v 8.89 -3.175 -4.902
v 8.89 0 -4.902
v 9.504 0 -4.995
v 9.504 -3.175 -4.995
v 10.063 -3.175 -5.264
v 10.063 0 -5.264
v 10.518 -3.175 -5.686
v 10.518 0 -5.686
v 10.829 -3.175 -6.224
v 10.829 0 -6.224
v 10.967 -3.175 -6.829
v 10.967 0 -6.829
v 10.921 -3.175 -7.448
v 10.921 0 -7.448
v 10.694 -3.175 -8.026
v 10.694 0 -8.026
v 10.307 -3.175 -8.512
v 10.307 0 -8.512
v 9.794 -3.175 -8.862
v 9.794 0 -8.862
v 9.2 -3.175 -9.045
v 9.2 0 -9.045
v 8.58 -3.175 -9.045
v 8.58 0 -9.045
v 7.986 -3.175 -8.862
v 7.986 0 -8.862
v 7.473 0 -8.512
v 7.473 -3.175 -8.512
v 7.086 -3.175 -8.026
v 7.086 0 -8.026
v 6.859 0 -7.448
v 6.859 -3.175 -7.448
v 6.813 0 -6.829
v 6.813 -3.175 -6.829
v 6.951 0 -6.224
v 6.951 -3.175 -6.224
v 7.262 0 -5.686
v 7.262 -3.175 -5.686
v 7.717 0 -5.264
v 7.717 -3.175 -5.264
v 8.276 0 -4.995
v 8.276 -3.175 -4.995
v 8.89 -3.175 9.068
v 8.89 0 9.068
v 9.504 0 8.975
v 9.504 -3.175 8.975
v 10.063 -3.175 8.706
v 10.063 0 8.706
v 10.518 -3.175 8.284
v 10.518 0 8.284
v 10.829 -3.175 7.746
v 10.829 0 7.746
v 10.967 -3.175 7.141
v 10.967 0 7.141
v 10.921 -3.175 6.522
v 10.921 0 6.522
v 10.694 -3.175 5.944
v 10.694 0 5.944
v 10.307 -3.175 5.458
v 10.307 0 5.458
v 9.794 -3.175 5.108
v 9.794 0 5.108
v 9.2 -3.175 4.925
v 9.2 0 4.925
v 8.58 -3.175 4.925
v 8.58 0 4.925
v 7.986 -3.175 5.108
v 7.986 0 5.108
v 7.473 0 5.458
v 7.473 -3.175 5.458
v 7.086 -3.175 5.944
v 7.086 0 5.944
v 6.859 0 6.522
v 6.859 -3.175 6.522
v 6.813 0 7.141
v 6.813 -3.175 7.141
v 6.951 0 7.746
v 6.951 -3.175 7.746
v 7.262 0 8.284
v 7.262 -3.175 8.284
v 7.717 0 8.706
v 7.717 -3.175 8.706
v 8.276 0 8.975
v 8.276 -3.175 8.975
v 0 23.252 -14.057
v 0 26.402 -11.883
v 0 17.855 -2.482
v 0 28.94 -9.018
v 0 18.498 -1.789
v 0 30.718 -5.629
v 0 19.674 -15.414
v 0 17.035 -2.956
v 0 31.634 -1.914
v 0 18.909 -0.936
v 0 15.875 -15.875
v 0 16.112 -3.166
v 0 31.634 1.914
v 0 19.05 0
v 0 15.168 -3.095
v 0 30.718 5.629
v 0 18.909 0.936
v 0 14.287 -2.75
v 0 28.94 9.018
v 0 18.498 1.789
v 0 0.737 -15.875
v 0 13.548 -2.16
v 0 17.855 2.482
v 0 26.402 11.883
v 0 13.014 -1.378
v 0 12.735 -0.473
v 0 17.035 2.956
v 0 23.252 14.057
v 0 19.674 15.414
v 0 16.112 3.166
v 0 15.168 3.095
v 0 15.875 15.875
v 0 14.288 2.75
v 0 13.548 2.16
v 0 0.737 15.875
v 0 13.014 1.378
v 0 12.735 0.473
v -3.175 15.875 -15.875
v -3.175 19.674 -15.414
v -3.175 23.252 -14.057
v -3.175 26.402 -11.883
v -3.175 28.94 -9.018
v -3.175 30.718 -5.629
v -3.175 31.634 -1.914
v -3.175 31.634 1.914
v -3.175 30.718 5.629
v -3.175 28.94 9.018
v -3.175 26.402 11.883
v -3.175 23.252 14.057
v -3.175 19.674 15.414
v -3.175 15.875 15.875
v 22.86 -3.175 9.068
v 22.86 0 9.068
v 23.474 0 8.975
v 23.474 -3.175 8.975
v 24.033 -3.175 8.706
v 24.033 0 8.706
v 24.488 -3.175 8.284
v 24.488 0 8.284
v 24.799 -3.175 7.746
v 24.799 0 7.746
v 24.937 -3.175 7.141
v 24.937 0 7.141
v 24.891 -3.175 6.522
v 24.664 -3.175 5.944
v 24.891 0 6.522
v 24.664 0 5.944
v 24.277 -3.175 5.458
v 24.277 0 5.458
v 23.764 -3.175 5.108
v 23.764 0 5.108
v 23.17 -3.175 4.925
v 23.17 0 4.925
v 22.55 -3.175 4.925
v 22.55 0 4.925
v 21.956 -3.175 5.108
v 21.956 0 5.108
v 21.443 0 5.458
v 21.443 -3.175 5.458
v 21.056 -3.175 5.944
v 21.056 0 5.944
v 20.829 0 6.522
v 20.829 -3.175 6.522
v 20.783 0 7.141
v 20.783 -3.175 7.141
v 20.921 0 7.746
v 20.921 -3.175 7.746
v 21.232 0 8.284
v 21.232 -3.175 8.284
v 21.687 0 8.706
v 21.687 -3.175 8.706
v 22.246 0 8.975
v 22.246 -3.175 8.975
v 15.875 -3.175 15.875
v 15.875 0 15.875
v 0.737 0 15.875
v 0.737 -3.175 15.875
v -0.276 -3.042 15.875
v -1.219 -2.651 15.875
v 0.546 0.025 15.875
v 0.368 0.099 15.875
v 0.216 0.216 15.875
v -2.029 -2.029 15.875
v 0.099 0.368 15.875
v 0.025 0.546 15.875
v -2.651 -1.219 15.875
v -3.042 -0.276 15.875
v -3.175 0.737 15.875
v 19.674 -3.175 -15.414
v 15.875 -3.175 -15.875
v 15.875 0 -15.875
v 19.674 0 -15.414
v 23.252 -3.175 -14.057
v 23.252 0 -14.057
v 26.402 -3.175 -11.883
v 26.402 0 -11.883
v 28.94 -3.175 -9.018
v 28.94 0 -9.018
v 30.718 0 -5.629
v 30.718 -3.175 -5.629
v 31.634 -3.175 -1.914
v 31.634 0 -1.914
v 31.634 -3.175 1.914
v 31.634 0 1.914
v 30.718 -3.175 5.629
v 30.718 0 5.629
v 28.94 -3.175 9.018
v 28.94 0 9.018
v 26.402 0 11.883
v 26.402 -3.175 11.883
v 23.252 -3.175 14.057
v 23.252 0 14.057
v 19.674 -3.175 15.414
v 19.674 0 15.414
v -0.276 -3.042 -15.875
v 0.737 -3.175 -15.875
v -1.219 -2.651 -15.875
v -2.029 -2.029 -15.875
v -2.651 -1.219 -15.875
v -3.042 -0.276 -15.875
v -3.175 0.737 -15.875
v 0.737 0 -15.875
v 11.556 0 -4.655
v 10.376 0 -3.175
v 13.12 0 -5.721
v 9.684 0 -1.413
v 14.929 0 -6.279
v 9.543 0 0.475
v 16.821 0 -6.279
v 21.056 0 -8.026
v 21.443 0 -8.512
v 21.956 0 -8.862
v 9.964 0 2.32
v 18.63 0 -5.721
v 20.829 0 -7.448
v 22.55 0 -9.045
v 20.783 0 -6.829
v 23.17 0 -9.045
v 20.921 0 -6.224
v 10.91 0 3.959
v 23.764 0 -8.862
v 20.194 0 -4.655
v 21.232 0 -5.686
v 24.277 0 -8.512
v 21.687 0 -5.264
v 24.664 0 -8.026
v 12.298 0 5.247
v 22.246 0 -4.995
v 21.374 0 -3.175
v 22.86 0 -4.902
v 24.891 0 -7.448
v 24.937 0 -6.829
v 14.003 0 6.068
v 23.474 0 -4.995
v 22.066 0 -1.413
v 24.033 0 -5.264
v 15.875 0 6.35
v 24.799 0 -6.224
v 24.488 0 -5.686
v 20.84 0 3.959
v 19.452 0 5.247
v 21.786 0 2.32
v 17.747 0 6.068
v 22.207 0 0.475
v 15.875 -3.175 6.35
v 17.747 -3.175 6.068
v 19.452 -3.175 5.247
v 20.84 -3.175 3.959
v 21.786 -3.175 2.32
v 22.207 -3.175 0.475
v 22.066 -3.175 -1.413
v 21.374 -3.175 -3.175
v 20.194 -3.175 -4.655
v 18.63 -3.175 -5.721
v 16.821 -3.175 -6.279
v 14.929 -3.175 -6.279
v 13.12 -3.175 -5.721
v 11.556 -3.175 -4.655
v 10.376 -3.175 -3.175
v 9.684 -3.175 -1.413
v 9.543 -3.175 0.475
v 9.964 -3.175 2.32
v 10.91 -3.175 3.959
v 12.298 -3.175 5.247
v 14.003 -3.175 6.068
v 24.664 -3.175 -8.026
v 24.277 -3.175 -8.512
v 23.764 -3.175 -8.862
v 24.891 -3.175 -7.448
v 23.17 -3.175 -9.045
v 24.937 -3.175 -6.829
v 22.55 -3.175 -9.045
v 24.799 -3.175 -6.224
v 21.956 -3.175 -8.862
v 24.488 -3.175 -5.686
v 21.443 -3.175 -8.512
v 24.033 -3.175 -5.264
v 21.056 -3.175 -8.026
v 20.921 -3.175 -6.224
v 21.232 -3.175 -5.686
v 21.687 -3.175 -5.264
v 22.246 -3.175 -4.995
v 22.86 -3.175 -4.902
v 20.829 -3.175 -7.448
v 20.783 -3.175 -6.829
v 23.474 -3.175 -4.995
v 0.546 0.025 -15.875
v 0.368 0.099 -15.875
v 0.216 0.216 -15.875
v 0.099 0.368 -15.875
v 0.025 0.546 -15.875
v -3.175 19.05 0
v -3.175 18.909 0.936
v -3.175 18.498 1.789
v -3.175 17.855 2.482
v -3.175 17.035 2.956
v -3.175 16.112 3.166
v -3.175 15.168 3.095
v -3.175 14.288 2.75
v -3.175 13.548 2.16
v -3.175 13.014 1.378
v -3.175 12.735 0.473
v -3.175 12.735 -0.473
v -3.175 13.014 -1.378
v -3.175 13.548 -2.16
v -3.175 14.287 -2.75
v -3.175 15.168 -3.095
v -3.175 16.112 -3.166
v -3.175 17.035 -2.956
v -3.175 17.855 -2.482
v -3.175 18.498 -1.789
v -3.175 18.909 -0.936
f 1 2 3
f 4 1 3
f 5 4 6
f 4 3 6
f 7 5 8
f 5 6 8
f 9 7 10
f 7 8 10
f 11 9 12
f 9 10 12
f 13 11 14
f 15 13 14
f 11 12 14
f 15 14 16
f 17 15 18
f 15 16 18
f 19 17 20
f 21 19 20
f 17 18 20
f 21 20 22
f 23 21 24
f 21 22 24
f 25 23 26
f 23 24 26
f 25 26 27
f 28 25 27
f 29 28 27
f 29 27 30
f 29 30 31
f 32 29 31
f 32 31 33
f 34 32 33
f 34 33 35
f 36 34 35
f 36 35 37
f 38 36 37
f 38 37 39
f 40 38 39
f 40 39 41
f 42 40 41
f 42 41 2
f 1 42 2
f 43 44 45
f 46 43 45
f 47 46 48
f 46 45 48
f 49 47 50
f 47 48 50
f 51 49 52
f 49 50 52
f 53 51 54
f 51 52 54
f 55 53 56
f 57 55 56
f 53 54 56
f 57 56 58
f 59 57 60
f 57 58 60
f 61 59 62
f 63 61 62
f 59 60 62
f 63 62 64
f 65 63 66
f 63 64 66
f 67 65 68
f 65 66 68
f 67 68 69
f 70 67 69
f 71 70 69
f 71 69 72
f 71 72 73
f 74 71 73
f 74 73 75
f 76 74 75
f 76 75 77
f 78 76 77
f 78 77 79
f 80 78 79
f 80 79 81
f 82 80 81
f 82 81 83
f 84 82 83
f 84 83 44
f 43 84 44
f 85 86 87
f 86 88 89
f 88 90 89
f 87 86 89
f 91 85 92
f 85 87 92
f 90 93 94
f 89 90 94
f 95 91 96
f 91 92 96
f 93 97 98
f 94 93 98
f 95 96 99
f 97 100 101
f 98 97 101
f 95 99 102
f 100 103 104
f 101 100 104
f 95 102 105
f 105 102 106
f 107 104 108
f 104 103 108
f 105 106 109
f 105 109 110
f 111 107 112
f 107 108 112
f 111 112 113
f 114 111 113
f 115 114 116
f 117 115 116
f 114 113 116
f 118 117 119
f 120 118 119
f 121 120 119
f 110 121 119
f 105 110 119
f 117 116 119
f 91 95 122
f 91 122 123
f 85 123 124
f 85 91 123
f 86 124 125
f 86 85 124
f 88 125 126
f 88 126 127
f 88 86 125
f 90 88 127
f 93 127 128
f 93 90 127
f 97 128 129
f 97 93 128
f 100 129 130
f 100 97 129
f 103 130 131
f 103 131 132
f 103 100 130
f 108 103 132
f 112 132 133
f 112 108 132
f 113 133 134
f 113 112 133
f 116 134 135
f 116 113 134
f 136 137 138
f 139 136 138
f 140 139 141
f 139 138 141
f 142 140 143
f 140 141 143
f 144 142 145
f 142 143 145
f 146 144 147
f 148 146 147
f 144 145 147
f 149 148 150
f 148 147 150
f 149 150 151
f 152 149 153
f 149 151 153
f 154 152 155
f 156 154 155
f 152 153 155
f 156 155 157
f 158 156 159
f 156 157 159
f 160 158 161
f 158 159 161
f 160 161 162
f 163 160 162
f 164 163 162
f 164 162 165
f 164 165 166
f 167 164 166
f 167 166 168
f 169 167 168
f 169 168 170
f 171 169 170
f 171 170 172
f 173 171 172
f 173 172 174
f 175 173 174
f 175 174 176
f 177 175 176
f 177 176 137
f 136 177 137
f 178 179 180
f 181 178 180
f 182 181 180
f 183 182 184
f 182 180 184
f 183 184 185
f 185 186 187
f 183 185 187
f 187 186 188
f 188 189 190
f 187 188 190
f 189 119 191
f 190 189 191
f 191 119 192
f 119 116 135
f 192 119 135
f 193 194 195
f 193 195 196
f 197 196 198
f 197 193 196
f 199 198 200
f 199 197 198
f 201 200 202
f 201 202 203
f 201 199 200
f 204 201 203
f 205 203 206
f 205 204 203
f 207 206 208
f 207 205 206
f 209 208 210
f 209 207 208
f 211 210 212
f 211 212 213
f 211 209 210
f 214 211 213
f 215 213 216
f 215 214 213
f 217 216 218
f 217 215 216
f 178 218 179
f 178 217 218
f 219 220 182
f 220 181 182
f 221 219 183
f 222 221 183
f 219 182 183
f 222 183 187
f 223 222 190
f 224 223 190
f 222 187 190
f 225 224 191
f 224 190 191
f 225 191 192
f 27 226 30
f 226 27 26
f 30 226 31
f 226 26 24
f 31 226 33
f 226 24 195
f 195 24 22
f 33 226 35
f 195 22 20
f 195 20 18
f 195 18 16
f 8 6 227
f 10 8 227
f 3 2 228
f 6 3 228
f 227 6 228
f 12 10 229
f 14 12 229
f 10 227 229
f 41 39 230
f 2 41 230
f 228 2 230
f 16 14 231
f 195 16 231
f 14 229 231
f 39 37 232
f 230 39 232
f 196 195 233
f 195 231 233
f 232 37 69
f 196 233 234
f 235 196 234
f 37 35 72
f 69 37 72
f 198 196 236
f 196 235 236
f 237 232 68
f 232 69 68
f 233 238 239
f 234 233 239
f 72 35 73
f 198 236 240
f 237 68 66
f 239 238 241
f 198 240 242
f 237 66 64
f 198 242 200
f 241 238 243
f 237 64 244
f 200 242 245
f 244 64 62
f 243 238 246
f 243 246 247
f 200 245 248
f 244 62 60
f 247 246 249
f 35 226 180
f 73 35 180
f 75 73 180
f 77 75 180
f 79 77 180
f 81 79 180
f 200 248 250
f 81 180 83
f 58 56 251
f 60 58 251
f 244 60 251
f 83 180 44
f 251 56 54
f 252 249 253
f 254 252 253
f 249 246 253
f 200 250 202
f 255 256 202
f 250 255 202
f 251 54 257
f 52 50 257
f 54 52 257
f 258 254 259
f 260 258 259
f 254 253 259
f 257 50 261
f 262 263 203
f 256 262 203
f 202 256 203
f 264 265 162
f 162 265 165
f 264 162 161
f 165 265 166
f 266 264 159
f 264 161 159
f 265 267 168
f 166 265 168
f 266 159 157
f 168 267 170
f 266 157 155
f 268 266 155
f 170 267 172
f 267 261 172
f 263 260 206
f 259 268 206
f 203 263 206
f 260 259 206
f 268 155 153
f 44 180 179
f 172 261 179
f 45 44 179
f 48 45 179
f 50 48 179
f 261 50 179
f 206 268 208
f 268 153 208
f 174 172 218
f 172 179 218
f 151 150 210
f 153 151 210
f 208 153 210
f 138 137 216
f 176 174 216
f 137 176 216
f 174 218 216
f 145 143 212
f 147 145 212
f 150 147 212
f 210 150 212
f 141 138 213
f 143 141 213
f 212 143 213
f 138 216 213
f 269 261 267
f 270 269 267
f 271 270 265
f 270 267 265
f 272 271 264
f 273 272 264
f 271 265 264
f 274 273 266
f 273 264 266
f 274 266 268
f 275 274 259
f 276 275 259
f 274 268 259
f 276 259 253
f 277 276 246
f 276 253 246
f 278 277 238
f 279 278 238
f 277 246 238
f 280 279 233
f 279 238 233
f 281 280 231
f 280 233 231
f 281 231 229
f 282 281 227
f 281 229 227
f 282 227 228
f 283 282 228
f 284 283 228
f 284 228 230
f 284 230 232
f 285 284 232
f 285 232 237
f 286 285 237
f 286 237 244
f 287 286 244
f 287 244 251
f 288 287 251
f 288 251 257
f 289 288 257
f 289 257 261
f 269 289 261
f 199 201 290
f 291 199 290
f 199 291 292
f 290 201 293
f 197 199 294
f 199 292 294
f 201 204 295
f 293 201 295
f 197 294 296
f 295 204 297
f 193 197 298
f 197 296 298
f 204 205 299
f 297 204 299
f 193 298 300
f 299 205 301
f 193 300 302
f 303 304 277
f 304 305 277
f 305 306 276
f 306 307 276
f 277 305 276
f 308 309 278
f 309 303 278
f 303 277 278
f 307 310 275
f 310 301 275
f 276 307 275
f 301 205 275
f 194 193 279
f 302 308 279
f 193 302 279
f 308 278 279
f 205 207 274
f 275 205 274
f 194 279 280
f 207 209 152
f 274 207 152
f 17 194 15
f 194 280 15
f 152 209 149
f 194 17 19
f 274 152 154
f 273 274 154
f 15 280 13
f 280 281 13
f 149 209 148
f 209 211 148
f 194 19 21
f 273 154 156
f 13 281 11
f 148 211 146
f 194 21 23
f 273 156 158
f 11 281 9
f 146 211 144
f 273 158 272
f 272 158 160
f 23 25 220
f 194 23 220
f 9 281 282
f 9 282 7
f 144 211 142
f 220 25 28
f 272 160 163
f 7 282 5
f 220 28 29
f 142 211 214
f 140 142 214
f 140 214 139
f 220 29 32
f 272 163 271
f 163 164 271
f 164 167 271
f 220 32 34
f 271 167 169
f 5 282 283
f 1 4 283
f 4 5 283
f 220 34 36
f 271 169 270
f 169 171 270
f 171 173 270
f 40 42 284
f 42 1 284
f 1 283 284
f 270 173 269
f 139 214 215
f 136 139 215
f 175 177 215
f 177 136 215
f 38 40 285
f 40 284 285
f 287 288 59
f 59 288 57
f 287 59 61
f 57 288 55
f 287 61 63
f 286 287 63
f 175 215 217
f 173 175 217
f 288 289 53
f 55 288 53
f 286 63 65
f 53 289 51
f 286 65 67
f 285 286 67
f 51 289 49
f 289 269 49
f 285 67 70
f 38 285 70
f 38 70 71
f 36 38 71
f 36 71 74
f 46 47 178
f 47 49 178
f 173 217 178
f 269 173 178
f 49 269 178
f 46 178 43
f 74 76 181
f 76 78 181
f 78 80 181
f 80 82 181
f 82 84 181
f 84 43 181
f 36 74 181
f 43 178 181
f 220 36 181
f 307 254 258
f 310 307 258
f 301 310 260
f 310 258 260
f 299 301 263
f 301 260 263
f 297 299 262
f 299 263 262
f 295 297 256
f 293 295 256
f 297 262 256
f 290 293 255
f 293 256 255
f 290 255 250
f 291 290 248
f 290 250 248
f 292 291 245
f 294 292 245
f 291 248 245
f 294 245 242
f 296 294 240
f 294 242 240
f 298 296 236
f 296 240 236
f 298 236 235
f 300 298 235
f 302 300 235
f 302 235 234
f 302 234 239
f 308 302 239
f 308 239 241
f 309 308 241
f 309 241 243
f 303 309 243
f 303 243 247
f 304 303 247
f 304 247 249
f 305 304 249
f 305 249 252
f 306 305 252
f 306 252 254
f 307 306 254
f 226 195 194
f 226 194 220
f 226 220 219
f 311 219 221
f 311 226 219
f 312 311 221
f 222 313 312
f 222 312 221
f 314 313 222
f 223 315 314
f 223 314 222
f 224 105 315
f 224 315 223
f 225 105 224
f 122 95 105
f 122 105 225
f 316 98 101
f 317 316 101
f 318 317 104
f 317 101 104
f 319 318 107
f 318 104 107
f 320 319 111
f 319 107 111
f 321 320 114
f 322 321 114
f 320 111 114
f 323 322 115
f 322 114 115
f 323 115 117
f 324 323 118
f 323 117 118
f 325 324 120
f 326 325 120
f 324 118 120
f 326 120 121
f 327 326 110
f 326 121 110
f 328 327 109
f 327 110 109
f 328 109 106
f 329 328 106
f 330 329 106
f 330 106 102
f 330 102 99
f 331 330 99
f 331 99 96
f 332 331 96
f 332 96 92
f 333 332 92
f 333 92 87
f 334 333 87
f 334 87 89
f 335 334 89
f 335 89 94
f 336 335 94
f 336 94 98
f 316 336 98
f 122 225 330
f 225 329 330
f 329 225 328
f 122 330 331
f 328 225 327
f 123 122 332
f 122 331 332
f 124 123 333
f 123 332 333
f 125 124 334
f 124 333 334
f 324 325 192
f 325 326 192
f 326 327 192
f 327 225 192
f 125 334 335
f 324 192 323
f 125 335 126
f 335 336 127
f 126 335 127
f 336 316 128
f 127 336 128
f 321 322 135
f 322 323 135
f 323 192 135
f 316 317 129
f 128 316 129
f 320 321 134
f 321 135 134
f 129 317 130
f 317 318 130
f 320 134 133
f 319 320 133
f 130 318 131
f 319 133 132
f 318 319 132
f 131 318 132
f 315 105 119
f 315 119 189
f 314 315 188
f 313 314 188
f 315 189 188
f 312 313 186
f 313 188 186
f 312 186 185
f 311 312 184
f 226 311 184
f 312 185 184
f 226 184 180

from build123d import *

# Parameters (mm, degrees)
BASE_FLANGE1_DEPTH = 15.875
FILLET1_RADIUS     = 15.875
FILLET1_LENGTH     = 3.175
FILLET2_RADIUS     = 15.875
FILLET2_LENGTH     = 3.175
SKETCH6_R          = 3.175
CUT_EXTRUDE1_DEPTH = 48.625
SKETCH7_R          = 6.35
CUT_EXTRUDE2_DEPTH = 48.625
SKETCH8_R          = 2.0828
CUT_EXTRUDE3_DEPTH = 48.625


# Sheet-metal steps are written as plain solids
with BuildPart() as part:
    # Sketch1 → Base-Flange1 (new, symmetric)
    with BuildSketch(Plane.XY):
        with BuildLine():
            Line((0, 31.75), (0, 0.7366))
            ThreePointArc((0, 0.7366), (0.215745145, 0.215745145), (0.7366, 0))
            Line((0.7366, 0), (31.75, 0))
            Line((31.75, 0), (31.75, -3.175))
            Line((31.75, -3.175), (0.7366, -3.175))
            ThreePointArc((0.7366, -3.175), (-2.029318885, -2.029318885), (-3.175, 0.7366))
            Line((-3.175, 0.7366), (-3.175, 31.75))
            Line((-3.175, 31.75), (0, 31.75))
        make_face()
    extrude(amount=BASE_FLANGE1_DEPTH, both=True)

    # Fillet1: full round fillet: the end face becomes a half cylinder, R = half its width
    fillet1_face = Plane((-1.5875, 31.75, 0), x_dir=(1, 0, 0), z_dir=(0, 1, 0))  # on the end face: x along it, z out of the body
    fillet1_slab = fillet1_face.offset(-FILLET1_RADIUS / 2) * Box(FILLET1_LENGTH, 2 * FILLET1_RADIUS, FILLET1_RADIUS, mode=Mode.PRIVATE)  # the body's end, R deep
    fillet1_round = Plane((-1.5875, 15.875, 0), x_dir=(0, 1, 0), z_dir=(1, 0, 0)) * Cylinder(FILLET1_RADIUS, FILLET1_LENGTH, mode=Mode.PRIVATE)  # its axis R under the face
    add(fillet1_slab - fillet1_round, mode=Mode.SUBTRACT)

    # Fillet2: full round fillet: the end face becomes a half cylinder, R = half its width
    fillet2_face = Plane((31.75, -1.5875, 0), x_dir=(0, -1, 0), z_dir=(1, 0, 0))  # on the end face: x along it, z out of the body
    fillet2_slab = fillet2_face.offset(-FILLET2_RADIUS / 2) * Box(FILLET2_LENGTH, 2 * FILLET2_RADIUS, FILLET2_RADIUS, mode=Mode.PRIVATE)  # the body's end, R deep
    fillet2_round = Plane((15.875, -1.5875, 0), x_dir=(1, 0, 0), z_dir=(0, -1, 0)) * Cylinder(FILLET2_RADIUS, FILLET2_LENGTH, mode=Mode.PRIVATE)  # its axis R under the face
    add(fillet2_slab - fillet2_round, mode=Mode.SUBTRACT)

    # Sketch6 → Cut-Extrude1 (cut, through all)
    with BuildSketch(Plane(origin=(0, 0, 0), x_dir=(0, 0, -1), z_dir=(1, 0, 0))):
        with Locations(Location((0, 15.875, 0), (0, 0, 90))):
            Circle(SKETCH6_R)
    extrude(amount=-CUT_EXTRUDE1_DEPTH, mode=Mode.SUBTRACT)

    # Sketch7 → Cut-Extrude2 (cut, through all)
    with BuildSketch(Plane(origin=(0, 0, 0), x_dir=(1, 0, 0), z_dir=(0, 1, 0))):
        with Locations(Location((15.875, 0, 0), (0, 0, 270))):
            Circle(SKETCH7_R)
    extrude(amount=-CUT_EXTRUDE2_DEPTH, mode=Mode.SUBTRACT)

    # Sketch8 → Cut-Extrude3 (cut, through all)
    with BuildSketch(Plane(origin=(0, 0, 0), x_dir=(1, 0, 0), z_dir=(0, 1, 0))):
        with Locations(Location((22.86, -6.985, 0), (0, 0, 270))):
            Circle(SKETCH8_R)
        with Locations(Location((22.86, 6.985, 0), (0, 0, 270))):
            Circle(SKETCH8_R)
        with Locations(Location((8.89, 6.985, 0), (0, 0, 270))):
            Circle(SKETCH8_R)
        with Locations(Location((8.89, -6.985, 0), (0, 0, 270))):
            Circle(SKETCH8_R)
    extrude(amount=-CUT_EXTRUDE3_DEPTH, mode=Mode.SUBTRACT)


solid = part.part
